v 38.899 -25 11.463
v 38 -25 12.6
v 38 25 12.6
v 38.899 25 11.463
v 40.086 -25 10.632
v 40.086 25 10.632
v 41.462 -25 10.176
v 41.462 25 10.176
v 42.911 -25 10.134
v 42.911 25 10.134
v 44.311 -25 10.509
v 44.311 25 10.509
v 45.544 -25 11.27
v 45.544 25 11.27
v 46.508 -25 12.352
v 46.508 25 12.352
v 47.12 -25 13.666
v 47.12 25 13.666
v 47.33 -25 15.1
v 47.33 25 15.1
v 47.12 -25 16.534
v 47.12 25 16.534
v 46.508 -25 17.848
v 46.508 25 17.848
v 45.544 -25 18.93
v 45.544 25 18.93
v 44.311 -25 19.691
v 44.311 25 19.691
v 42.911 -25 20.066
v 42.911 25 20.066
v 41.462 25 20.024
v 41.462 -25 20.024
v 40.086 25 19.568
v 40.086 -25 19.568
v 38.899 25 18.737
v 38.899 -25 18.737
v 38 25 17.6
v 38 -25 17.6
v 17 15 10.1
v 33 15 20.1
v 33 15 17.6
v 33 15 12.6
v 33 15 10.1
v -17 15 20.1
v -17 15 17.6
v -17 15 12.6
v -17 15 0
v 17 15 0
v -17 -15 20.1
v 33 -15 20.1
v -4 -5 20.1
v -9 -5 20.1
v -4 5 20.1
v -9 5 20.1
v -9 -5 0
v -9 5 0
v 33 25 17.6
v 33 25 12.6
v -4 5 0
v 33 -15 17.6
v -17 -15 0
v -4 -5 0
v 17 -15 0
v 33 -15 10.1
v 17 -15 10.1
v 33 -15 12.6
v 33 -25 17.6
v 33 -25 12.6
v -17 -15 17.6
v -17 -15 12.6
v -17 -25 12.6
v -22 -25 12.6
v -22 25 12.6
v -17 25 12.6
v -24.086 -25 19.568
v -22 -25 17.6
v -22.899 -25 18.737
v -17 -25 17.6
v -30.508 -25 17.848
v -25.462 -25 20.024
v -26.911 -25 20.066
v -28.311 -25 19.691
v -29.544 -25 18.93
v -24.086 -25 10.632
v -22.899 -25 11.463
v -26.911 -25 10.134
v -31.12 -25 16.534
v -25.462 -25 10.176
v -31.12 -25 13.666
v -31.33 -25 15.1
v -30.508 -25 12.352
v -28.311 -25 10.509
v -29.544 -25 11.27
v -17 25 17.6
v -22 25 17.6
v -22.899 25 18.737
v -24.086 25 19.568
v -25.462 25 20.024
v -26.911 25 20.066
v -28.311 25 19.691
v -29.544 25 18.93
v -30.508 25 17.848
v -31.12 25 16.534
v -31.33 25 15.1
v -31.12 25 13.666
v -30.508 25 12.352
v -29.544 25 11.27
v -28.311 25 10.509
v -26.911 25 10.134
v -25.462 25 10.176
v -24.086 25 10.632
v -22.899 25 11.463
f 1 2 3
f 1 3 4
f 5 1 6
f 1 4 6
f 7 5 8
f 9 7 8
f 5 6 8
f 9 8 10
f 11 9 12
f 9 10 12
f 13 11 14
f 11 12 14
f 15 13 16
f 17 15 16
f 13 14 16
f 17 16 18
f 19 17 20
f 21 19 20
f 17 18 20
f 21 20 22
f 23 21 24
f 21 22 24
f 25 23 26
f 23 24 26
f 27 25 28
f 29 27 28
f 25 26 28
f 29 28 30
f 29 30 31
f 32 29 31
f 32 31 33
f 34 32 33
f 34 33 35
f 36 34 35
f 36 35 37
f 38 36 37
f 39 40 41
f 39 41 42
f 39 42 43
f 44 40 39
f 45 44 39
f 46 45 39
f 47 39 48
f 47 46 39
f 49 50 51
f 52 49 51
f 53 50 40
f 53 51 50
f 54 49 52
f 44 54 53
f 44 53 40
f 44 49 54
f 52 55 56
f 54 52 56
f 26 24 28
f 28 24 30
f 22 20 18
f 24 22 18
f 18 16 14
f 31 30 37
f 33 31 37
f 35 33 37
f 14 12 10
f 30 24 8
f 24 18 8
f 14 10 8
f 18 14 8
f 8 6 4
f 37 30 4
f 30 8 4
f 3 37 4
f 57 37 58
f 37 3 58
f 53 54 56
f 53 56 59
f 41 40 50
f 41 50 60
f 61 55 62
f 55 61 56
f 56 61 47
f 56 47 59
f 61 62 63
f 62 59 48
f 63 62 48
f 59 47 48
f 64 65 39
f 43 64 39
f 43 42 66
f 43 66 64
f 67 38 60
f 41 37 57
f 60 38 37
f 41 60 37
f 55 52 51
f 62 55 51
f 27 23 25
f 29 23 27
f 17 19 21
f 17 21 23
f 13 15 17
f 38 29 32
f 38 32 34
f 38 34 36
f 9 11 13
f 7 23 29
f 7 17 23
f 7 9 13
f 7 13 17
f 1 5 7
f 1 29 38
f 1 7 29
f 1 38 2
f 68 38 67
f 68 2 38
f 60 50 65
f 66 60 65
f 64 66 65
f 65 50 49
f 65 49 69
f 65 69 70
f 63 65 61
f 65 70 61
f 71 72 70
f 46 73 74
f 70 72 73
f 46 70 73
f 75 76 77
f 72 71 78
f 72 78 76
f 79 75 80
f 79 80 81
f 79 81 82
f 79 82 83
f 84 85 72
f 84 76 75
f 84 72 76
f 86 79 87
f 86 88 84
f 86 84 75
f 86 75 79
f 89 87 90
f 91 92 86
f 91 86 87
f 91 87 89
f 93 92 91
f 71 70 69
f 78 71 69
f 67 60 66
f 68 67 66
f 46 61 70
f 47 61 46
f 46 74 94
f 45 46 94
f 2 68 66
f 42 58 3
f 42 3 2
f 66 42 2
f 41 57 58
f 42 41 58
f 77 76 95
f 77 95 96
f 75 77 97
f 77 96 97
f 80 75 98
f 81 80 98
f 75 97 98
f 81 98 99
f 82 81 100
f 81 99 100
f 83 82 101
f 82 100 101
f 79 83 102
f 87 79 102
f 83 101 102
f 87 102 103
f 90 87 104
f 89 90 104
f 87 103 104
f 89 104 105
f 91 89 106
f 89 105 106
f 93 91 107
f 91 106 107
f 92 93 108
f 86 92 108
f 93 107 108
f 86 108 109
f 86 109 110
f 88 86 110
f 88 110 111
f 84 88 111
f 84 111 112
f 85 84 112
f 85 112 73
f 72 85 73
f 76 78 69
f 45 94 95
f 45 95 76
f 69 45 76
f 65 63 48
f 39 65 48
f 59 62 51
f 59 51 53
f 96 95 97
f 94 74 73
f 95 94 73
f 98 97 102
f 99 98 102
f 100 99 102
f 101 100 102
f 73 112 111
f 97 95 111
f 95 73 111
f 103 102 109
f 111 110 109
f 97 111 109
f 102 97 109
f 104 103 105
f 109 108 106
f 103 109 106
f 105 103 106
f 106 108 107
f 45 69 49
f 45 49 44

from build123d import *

# Parameters (mm, degrees)
ESBO_O1_W                = 34
ESBO_O1_H                = 30
ESBO_O1_W_2              = 5
ESBO_O1_H_2              = 10
RESSALTO_EXTRUS_O1_DEPTH = 20.1
ESBO_O2_W                = 10
ESBO_O2_H                = 30
RESSALTO_EXTRUS_O2_DEPTH = 16
RESSALTO_EXTRUS_O3_DEPTH = 50


with BuildPart() as part:
    # Esboço1 → Ressalto-extrusão1 (new body)
    with BuildSketch(Plane.XY):
        Rectangle(ESBO_O1_W, ESBO_O1_H)
        with Locations((-6.5, 0)):
            Rectangle(ESBO_O1_W_2, ESBO_O1_H_2, mode=Mode.SUBTRACT)
    extrude(amount=RESSALTO_EXTRUS_O1_DEPTH)

    # Esboço2 → Ressalto-extrusão2 (add)
    with BuildSketch(Plane(origin=(17, 0, 0), x_dir=(0, 0, -1), z_dir=(1, 0, 0))):
        with Locations((-15.1, 0)):
            Rectangle(ESBO_O2_W, ESBO_O2_H)
    extrude(amount=RESSALTO_EXTRUS_O2_DEPTH)

    # Esboço3 → Ressalto-extrusão3 (add)
    with BuildSketch(Plane(origin=(0, 25, 0), x_dir=(1, 0, 0), z_dir=(0, 1, 0))):
        with BuildLine():
            Line((33, -12.6), (38, -12.6))
            ThreePointArc((38, -12.6), (47.330127019, -15.1), (38, -17.6))
            Line((38, -17.6), (33, -17.6))
            Line((33, -17.6), (33, -12.6))
        make_face()
        with BuildLine():
            Line((-17, -12.6), (-17, -17.6))
            Line((-17, -17.6), (-22, -17.6))
            ThreePointArc((-22, -17.6), (-31.330127019, -15.1), (-22, -12.6))
            Line((-22, -12.6), (-17, -12.6))
        make_face()
    extrude(amount=-RESSALTO_EXTRUS_O3_DEPTH)


solid = part.part
